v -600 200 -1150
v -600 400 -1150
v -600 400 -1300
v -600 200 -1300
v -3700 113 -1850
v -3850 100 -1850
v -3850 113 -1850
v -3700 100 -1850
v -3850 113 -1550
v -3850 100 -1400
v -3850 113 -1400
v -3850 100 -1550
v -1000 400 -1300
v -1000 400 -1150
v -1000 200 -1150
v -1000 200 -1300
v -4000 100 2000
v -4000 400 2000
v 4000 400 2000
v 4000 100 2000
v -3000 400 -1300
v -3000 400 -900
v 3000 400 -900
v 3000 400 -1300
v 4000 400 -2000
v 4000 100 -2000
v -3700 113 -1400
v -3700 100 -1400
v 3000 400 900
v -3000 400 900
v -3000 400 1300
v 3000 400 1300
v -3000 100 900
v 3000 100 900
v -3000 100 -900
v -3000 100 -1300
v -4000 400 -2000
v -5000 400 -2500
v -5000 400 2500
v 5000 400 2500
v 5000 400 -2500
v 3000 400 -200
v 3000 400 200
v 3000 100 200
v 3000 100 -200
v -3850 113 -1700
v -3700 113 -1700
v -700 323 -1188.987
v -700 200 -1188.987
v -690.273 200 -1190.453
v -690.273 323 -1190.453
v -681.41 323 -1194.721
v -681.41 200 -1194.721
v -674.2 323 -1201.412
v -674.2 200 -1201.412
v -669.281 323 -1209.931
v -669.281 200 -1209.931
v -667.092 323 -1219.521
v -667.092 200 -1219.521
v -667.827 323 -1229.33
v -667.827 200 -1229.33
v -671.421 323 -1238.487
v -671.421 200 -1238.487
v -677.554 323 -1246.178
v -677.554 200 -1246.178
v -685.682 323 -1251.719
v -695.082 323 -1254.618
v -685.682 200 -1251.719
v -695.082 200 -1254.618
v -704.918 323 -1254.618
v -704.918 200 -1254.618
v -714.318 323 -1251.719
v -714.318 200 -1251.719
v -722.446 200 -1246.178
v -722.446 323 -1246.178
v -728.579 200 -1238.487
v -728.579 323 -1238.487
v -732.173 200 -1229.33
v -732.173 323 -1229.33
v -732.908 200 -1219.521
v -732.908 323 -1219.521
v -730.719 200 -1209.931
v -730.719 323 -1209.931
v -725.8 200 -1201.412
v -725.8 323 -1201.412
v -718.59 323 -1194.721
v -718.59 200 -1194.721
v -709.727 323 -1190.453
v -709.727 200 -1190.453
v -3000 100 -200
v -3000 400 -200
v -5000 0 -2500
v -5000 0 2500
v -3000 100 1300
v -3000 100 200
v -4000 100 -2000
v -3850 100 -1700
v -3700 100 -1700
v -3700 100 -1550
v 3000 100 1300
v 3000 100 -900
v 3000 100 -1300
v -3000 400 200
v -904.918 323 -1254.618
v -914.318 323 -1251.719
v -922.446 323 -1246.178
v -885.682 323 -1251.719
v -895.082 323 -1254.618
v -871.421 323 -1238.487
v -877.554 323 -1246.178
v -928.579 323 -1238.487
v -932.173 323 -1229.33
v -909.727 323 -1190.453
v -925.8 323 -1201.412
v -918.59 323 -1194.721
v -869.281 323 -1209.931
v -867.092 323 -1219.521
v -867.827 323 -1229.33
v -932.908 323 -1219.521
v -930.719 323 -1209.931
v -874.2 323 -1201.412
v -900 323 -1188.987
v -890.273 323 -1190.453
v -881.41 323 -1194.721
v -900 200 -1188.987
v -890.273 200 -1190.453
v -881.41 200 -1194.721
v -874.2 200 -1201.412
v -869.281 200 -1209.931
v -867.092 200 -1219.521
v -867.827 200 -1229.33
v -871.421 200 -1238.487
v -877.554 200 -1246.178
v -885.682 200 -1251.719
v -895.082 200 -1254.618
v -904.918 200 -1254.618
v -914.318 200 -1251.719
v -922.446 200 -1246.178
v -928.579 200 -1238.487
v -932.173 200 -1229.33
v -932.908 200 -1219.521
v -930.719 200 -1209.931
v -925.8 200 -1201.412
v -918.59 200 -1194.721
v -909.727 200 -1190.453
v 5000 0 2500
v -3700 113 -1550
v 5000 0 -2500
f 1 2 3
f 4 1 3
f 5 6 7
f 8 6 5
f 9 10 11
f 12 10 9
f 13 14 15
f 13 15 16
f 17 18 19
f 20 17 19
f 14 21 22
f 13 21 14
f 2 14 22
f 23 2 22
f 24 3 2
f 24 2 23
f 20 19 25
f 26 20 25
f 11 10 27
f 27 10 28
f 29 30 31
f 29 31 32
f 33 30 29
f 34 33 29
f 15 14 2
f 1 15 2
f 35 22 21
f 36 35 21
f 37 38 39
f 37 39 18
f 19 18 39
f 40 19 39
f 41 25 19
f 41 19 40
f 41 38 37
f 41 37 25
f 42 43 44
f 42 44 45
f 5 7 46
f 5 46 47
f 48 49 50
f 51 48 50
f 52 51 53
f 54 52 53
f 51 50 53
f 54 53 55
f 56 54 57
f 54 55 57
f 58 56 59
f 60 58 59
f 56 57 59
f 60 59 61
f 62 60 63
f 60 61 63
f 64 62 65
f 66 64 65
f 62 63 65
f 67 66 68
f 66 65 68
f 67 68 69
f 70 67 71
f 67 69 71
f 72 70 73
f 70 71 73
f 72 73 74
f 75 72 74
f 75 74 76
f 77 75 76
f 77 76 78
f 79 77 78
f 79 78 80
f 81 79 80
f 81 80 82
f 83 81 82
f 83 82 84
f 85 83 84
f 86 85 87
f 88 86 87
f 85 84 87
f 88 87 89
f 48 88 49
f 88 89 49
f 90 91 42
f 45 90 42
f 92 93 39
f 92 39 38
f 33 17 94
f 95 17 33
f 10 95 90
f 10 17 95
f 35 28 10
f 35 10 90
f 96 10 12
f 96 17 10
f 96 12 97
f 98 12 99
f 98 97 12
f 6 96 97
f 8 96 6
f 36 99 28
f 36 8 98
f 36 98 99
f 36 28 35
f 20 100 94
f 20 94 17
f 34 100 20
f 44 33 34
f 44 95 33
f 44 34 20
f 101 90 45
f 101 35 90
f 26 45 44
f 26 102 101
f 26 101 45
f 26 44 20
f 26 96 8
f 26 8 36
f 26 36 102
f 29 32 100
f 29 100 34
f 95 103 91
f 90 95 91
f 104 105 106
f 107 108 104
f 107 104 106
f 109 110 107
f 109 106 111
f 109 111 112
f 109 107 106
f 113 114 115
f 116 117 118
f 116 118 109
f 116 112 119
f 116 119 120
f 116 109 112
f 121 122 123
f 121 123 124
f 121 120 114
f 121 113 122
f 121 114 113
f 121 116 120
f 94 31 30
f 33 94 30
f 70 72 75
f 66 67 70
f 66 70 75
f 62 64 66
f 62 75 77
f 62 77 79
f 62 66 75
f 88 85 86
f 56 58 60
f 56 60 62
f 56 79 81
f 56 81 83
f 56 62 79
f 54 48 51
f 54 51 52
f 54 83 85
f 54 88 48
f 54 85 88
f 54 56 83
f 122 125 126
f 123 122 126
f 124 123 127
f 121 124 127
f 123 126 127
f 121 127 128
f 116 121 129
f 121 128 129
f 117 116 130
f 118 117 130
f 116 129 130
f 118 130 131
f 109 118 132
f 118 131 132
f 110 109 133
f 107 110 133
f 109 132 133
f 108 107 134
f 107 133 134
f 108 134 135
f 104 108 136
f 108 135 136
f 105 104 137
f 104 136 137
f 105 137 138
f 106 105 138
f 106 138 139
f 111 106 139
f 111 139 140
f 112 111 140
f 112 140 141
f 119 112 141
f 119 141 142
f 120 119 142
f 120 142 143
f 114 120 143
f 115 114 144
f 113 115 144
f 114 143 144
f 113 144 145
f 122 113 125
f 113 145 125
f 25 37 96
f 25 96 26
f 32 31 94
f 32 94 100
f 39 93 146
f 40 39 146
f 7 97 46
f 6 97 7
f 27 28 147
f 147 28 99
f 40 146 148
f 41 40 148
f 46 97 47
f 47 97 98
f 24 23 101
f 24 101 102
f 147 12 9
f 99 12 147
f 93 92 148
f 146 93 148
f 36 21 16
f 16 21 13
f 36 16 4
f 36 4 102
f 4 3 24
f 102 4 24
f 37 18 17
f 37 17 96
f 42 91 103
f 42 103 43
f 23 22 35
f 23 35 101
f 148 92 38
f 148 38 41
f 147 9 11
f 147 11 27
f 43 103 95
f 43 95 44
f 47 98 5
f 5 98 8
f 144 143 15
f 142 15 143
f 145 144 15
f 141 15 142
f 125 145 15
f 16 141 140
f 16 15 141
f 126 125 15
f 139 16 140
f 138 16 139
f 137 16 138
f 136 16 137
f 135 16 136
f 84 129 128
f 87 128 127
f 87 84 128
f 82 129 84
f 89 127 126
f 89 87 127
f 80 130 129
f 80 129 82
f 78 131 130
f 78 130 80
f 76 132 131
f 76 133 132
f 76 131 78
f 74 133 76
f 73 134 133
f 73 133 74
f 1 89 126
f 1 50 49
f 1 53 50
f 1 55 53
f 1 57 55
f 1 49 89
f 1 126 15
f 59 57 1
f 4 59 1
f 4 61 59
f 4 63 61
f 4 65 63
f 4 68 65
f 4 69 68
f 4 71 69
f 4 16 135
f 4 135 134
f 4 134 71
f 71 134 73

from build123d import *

# Parameters (mm, degrees)
SKETCH_1_W          = 10000
SKETCH_1_H          = 5000
EXTRUDE_1_DEPTH     = 400
SKETCH_2_W          = 8000
SKETCH_2_H          = 4000
SKETCH_2_W_2        = 6000
SKETCH_2_H_2        = 400
CUT_EXTRUDE_2_DEPTH = 300
SKETCH_4_W          = 150
SKETCH_4_H          = 150
EXTRUDE_3_DEPTH     = 13
SKETCH_3_W          = 400
SKETCH_3_H          = 150
CUT_EXTRUDE_4_DEPTH = 200
SKETCH_5_R          = 33
EXTRUDE_5_DEPTH     = 123


with BuildPart() as part:
    # 草圖1 → 伸長1 (new body)
    with BuildSketch(Plane(origin=(0, 0, 0), x_dir=(1, 0, 0), z_dir=(0, 1, 0))):
        Rectangle(SKETCH_1_W, SKETCH_1_H)
    extrude(amount=EXTRUDE_1_DEPTH)

    # 草圖2 → 伸長2 (cut)
    with BuildSketch(Plane(origin=(0, 400, 0), x_dir=(1, 0, 0), z_dir=(0, 1, 0))):
        Rectangle(SKETCH_2_W, SKETCH_2_H)
        with Locations((0, 1100)):
            Rectangle(SKETCH_2_W_2, SKETCH_2_H_2, mode=Mode.SUBTRACT)
        Rectangle(SKETCH_2_W_2, SKETCH_2_H_2, mode=Mode.SUBTRACT)
        with Locations((0, -1100)):
            Rectangle(SKETCH_2_W_2, SKETCH_2_H_2, mode=Mode.SUBTRACT)
    extrude(amount=-CUT_EXTRUDE_2_DEPTH, mode=Mode.SUBTRACT)

    # 草圖4 → 伸長3 (add)
    with BuildSketch(Plane(origin=(0, 100, 0), x_dir=(1, 0, 0), z_dir=(0, 1, 0))):
        with Locations((-3775, 1775)):
            Rectangle(SKETCH_4_W, SKETCH_4_H)
        with Locations((-3775, 1475)):
            Rectangle(SKETCH_4_W, SKETCH_4_H)
    extrude(amount=EXTRUDE_3_DEPTH)

    # 草圖3 → 伸長4 (cut)
    with BuildSketch(Plane(origin=(0, 400, 0), x_dir=(1, 0, 0), z_dir=(0, 1, 0))):
        with Locations((-800, 1225)):
            Rectangle(SKETCH_3_W, SKETCH_3_H)
    extrude(amount=-CUT_EXTRUDE_4_DEPTH, mode=Mode.SUBTRACT)

    # 草圖5 → 伸長5 (add)
    with BuildSketch(Plane(origin=(0, 200, 0), x_dir=(1, 0, 0), z_dir=(0, 1, 0))):
        with Locations(Location((-900, 1221.986986265, 0), (0, 0, 270))):
            Circle(SKETCH_5_R)
        with Locations(Location((-700, 1221.986986265, 0), (0, 0, 270))):
            Circle(SKETCH_5_R)
    extrude(amount=EXTRUDE_5_DEPTH)


solid = part.part
